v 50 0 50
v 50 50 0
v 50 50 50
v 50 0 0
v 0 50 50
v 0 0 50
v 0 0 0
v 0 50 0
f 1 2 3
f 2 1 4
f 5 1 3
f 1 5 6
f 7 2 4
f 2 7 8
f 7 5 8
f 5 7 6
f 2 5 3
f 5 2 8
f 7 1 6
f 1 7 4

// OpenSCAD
// When all 8 corners of the cube have zero or negative values.
// It means the whole cube is on/inside the 3D model.

module labeled_cube(corner, size) {
  translate(corner) {
    color([1, 1, 1, 0.5]) cube(size); // create a transparent cube with the given size, centered at the given corner coordinates

    // label the corner points
    translate([0, 0, -5]) rotate([90, 0, 0]) text("C0", size=5);
    translate([size[0], 0, -5]) rotate([90, 0, 0]) text("C1", size=5);
    translate([size[0], size[1], -5]) rotate([90, 0, 0]) text("C2", size=5);
    translate([0, size[1], -5]) rotate([90, 0, 0]) text("C3", size=5);
    translate([0, 0, size[2]]) rotate([90, 0, 0]) text("C4", size=5);
    translate([size[0], 0, size[2]]) rotate([90, 0, 0]) text("C5", size=5);
    translate([size[0], size[1], size[2]]) rotate([90, 0, 0]) text("C6", size=5);
    translate([0, size[1], size[2]]) rotate([90, 0, 0]) text("C7", size=5);
  }
}

module divide_cube_into_tetrahedra(cube_size, alpha=0.5, colors=[
    [1, 0, 0, alpha],  // red
    [0, 1, 0, alpha],  // green
    [0, 0, 1, alpha],  // blue
    [1, 1, 0, alpha],  // yellow
    [1, 0, 1, alpha],  // magenta
    [0, 1, 1, alpha]   // cyan
]) {
    // Define the vertices of the cube
    cube_vertices = [
        [0, 0, 0],
        [cube_size, 0, 0],
        [cube_size, cube_size, 0],
        [0, cube_size, 0],
        [0, 0, cube_size],
        [cube_size, 0, cube_size],
        [0, cube_size, cube_size],
        [cube_size, cube_size, cube_size],
    ];

    tetrahedron_indices = [
        [0, 4, 6, 7],
        [0, 3, 6, 7],
        [0, 4, 5, 7],
        [0, 1, 5, 7],
        [0, 3, 2, 7],
        [0, 1, 2, 7],
    ];

    // Define the tetrahedra by selecting vertices from the cube
    for (i = [0:5]) {
        // Define the indices of the vertices for the tetrahedron
        vertex_indices = tetrahedron_indices[i];

        // Define the vertices of the tetrahedron
        tetrahedron_vertices = [
            cube_vertices[vertex_indices[0]],
            cube_vertices[vertex_indices[1]],
            cube_vertices[vertex_indices[2]],
            cube_vertices[vertex_indices[3]]
        ];

        // Color the tetrahedron with the specified color
        color(colors[i]) polyhedron(points=tetrahedron_vertices, faces=[[0, 1, 2], [0, 2, 3], [0, 3, 1], [1, 2, 3]]);
    }

    // Draw the cube
    color([1, 1, 1, 0]) cube(cube_size);
}

module labeled_and_divided_cube(cube_size, alpha=0.5, colors=[
    [1, 0, 0, alpha],  // red
    [0, 1, 0, alpha],  // green
    [0, 0, 1, alpha],  // blue
    [1, 1, 0, alpha],  // yellow
    [1, 0, 1, alpha],  // magenta
    [0, 1, 1, alpha]   // cyan
]) {
    // Define the center of the cube
    center = [cube_size/2, cube_size/2, cube_size/2];

    // Label the corners of the cube
    labeled_cube([0, 0, 0], [cube_size, cube_size, cube_size]);

    // Divide the cube into tetrahedra
    divide_cube_into_tetrahedra(cube_size, alpha, colors);
}

// Example usage of the module
cube_size = 50;
alpha = 0.5;
colors = [
    [1, 0, 0, alpha],  // red
    [0, 1, 0, alpha],  // green
    [0, 0, 1, alpha],  // blue
    [1, 1, 0, alpha],  // yellow
    [1, 0, 1, alpha],  // magenta
    [0, 1, 1, alpha]   // cyan
];

labeled_and_divided_cube(cube_size, alpha, colors);
